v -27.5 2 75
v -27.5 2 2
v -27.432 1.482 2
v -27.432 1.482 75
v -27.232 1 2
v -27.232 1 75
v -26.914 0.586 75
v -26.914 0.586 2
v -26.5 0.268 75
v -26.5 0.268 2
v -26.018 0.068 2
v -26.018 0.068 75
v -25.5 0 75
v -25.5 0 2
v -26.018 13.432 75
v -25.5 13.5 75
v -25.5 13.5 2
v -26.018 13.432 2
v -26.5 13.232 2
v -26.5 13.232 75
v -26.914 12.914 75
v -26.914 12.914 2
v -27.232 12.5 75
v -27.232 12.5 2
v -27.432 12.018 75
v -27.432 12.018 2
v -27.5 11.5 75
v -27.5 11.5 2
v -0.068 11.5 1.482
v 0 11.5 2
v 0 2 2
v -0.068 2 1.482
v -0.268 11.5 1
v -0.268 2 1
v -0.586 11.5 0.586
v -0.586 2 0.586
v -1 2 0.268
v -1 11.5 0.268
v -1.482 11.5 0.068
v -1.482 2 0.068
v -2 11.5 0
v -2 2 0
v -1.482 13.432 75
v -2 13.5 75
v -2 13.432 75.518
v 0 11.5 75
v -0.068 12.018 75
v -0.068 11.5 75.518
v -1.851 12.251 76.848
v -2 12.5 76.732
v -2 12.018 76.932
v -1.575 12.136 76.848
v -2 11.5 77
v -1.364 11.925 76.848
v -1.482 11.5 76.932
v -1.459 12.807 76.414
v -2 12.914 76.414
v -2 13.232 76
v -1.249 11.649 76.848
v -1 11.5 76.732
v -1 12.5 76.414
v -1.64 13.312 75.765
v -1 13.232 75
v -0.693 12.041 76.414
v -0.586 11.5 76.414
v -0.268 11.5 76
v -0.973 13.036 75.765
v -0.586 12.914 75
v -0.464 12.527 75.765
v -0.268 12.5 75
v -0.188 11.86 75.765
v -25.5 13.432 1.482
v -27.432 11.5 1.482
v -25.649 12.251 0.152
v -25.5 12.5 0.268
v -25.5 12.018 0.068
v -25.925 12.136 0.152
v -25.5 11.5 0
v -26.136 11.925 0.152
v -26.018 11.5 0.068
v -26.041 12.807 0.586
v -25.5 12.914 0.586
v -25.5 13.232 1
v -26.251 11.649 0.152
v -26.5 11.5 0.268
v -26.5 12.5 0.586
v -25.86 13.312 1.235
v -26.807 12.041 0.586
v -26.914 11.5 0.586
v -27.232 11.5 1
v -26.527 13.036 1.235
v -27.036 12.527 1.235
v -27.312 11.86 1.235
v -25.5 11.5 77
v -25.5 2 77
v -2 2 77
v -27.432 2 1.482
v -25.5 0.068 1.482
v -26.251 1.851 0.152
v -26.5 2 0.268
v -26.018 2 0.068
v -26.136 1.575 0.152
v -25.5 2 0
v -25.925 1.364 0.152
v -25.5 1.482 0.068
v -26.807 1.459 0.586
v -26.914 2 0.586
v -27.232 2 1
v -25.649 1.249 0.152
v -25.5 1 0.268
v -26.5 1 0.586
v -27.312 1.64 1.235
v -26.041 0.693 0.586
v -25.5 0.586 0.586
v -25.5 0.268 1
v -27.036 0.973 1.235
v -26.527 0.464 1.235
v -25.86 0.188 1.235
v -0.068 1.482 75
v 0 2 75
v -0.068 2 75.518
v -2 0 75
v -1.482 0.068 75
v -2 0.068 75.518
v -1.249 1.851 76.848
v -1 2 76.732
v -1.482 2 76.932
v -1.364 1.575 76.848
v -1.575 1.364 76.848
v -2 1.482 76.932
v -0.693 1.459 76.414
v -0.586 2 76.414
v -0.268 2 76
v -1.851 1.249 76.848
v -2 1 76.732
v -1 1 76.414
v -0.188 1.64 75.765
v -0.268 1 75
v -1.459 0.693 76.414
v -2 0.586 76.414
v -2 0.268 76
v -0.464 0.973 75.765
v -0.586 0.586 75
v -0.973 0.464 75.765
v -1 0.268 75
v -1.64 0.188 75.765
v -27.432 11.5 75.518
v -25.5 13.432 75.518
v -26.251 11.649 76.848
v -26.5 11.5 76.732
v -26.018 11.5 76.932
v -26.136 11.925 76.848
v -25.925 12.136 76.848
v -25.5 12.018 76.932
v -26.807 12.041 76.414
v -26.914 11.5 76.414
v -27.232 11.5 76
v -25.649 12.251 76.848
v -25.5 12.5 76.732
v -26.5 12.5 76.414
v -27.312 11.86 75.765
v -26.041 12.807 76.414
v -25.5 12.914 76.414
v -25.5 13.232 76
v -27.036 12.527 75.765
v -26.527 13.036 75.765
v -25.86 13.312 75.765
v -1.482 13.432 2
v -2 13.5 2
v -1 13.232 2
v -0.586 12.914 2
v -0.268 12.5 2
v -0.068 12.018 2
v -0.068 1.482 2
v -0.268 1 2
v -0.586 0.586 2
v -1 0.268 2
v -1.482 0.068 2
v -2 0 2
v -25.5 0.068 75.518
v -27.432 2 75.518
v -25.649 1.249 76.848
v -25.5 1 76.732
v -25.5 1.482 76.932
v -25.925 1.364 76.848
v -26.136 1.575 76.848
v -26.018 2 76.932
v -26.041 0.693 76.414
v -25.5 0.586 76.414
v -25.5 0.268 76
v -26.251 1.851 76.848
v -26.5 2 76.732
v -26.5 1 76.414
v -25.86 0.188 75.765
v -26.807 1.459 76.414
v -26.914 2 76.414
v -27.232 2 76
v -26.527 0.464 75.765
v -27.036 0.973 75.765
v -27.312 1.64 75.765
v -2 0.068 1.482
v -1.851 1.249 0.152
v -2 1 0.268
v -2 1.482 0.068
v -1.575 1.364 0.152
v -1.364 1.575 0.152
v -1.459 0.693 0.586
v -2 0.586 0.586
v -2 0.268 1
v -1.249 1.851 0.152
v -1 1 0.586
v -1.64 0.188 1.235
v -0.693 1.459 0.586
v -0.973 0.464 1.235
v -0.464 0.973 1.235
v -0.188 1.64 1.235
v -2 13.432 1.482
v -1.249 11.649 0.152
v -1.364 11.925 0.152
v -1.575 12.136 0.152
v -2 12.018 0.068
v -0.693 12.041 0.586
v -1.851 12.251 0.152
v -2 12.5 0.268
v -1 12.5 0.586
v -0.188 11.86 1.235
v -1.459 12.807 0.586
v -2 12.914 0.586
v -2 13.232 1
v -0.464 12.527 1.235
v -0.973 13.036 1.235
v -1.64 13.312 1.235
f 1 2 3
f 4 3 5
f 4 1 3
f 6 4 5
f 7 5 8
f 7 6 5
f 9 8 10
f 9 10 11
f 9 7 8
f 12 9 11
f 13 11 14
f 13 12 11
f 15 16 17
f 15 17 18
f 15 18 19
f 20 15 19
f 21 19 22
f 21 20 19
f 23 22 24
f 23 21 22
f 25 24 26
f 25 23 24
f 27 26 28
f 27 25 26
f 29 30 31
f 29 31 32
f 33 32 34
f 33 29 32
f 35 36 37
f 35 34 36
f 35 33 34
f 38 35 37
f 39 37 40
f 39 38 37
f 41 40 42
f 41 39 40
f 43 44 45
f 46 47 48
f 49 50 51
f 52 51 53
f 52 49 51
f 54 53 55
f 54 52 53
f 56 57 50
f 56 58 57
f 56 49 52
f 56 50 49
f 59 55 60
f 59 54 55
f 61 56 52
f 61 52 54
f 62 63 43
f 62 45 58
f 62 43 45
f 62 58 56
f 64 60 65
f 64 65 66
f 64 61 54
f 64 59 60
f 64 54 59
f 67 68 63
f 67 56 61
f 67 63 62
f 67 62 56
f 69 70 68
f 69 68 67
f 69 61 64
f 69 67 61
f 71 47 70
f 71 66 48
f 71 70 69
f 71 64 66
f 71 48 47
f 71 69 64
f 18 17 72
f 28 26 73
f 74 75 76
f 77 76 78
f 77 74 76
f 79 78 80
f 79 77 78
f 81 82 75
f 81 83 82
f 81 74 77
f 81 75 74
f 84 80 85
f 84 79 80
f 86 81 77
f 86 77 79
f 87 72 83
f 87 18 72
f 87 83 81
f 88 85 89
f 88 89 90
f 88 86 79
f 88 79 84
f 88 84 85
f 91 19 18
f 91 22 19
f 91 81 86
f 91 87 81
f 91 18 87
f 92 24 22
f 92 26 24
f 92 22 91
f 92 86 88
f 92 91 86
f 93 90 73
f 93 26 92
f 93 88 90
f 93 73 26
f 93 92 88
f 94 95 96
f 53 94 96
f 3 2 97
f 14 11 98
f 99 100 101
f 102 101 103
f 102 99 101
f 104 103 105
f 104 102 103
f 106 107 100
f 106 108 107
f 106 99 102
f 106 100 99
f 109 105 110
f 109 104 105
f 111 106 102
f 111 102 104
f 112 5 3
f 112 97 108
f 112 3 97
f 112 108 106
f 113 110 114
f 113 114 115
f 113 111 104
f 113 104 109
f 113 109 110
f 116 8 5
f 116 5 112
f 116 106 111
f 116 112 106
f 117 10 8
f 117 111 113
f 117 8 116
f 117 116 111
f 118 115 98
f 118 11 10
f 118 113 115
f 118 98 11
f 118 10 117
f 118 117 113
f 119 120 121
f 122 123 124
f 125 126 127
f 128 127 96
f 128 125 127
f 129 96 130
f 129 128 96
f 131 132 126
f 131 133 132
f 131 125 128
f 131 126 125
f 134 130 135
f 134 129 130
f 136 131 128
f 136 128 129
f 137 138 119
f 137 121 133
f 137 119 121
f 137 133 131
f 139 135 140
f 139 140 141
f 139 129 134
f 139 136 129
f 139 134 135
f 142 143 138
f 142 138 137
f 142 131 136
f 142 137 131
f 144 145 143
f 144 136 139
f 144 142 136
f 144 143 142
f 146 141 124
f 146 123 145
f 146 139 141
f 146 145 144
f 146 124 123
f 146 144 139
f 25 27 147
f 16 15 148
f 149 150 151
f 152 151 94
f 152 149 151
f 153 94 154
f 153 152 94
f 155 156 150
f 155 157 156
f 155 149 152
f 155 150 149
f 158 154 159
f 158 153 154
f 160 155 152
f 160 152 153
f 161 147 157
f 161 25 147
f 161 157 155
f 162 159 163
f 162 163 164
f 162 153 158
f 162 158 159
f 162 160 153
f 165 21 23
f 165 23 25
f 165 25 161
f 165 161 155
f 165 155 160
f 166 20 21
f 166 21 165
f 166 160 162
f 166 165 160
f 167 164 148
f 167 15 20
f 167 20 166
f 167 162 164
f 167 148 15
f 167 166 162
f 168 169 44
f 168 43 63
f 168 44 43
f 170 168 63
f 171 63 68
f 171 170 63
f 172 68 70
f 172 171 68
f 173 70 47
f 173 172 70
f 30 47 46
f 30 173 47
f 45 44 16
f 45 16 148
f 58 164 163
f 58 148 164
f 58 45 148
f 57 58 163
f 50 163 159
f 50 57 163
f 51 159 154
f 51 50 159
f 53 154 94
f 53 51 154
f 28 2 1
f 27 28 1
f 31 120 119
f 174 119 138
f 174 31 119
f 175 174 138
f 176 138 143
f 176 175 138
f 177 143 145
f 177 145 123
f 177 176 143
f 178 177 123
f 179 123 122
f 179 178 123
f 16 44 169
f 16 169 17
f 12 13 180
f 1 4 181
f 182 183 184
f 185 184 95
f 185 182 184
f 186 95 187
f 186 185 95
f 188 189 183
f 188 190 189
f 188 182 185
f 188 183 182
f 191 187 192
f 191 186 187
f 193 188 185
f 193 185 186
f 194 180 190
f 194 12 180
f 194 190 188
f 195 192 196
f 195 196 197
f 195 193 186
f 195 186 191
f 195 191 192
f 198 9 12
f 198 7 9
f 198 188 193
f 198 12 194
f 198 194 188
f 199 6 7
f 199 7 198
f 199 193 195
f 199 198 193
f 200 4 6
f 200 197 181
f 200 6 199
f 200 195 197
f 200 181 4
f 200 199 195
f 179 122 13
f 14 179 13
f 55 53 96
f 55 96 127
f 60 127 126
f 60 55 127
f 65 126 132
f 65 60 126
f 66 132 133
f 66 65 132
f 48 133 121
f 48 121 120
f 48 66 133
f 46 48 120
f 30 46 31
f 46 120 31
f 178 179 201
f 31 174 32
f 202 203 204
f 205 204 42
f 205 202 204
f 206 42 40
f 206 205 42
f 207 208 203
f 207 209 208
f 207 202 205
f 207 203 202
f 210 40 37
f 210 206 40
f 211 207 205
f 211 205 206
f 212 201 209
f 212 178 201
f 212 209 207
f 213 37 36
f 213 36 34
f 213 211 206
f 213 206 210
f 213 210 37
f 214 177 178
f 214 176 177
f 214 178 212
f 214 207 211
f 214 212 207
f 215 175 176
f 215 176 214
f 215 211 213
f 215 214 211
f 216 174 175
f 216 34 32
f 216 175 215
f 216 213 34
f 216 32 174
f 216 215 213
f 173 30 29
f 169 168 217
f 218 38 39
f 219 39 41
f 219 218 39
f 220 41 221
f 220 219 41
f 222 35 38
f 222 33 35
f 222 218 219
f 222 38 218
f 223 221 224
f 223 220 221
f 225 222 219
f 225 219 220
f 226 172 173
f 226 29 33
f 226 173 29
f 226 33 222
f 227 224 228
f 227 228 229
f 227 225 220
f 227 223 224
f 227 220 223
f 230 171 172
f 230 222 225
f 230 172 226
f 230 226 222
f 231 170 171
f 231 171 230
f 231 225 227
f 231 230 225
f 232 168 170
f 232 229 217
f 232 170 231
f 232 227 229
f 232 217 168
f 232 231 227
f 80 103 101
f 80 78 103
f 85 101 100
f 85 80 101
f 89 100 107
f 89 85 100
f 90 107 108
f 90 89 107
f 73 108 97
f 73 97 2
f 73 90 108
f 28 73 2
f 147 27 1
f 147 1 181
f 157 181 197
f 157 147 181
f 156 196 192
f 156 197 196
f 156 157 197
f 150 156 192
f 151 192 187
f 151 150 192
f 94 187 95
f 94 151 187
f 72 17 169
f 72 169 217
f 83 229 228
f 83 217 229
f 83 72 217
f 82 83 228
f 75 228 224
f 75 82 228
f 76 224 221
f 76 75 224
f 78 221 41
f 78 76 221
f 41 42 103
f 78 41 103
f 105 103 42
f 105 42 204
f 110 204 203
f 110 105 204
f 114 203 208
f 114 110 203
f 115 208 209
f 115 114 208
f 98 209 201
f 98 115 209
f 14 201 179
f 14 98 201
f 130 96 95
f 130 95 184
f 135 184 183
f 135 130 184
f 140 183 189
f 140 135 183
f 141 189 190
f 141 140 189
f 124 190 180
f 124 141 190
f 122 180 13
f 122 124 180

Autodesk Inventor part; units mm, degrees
ref_plane "YZ Plane" through (0, 0, 0) normal (1, 0, 0) x (0, 1, 0)
ref_plane "XZ Plane" through (0, 0, 0) normal (0, 1, 0) x (-1, 0, 0)
ref_plane "XY Plane" through (0, 0, 0) normal (0, 0, 1) x (1, 0, 0)
sketch "Sketch1" plane through (0, 0, 0) normal (0, 1, 0) x (-1, 0, 0)
  line L0 (0, 0) -> (27.5, 0)
  line L1 (27.5, 0) -> (27.5, 77)
  line L2 (27.5, 77) -> (0, 77)
  line L3 (0, 77) -> (0, 0)
  dimension "d0" = 77
  dimension "d1" = 27.5
extrude "Extrusion1" add sketch "Sketch1" along normal blind 13.5
fillet "Fillet1" radius 2 12 edges at (0, 13.5, 38.5) (0, 0, 38.5) (-27.5, 13.5, 38.5) (-27.5, 0, 38.5) (-13.75, 13.5, 0) (-27.5, 6.75, 0) (-13.75, 0, 0) (0, 6.75, 0) (0, 6.75, 77) (-13.75, 0, 77) (-13.75, 13.5, 77) (-27.5, 6.75, 77)
properties part number "battery"
